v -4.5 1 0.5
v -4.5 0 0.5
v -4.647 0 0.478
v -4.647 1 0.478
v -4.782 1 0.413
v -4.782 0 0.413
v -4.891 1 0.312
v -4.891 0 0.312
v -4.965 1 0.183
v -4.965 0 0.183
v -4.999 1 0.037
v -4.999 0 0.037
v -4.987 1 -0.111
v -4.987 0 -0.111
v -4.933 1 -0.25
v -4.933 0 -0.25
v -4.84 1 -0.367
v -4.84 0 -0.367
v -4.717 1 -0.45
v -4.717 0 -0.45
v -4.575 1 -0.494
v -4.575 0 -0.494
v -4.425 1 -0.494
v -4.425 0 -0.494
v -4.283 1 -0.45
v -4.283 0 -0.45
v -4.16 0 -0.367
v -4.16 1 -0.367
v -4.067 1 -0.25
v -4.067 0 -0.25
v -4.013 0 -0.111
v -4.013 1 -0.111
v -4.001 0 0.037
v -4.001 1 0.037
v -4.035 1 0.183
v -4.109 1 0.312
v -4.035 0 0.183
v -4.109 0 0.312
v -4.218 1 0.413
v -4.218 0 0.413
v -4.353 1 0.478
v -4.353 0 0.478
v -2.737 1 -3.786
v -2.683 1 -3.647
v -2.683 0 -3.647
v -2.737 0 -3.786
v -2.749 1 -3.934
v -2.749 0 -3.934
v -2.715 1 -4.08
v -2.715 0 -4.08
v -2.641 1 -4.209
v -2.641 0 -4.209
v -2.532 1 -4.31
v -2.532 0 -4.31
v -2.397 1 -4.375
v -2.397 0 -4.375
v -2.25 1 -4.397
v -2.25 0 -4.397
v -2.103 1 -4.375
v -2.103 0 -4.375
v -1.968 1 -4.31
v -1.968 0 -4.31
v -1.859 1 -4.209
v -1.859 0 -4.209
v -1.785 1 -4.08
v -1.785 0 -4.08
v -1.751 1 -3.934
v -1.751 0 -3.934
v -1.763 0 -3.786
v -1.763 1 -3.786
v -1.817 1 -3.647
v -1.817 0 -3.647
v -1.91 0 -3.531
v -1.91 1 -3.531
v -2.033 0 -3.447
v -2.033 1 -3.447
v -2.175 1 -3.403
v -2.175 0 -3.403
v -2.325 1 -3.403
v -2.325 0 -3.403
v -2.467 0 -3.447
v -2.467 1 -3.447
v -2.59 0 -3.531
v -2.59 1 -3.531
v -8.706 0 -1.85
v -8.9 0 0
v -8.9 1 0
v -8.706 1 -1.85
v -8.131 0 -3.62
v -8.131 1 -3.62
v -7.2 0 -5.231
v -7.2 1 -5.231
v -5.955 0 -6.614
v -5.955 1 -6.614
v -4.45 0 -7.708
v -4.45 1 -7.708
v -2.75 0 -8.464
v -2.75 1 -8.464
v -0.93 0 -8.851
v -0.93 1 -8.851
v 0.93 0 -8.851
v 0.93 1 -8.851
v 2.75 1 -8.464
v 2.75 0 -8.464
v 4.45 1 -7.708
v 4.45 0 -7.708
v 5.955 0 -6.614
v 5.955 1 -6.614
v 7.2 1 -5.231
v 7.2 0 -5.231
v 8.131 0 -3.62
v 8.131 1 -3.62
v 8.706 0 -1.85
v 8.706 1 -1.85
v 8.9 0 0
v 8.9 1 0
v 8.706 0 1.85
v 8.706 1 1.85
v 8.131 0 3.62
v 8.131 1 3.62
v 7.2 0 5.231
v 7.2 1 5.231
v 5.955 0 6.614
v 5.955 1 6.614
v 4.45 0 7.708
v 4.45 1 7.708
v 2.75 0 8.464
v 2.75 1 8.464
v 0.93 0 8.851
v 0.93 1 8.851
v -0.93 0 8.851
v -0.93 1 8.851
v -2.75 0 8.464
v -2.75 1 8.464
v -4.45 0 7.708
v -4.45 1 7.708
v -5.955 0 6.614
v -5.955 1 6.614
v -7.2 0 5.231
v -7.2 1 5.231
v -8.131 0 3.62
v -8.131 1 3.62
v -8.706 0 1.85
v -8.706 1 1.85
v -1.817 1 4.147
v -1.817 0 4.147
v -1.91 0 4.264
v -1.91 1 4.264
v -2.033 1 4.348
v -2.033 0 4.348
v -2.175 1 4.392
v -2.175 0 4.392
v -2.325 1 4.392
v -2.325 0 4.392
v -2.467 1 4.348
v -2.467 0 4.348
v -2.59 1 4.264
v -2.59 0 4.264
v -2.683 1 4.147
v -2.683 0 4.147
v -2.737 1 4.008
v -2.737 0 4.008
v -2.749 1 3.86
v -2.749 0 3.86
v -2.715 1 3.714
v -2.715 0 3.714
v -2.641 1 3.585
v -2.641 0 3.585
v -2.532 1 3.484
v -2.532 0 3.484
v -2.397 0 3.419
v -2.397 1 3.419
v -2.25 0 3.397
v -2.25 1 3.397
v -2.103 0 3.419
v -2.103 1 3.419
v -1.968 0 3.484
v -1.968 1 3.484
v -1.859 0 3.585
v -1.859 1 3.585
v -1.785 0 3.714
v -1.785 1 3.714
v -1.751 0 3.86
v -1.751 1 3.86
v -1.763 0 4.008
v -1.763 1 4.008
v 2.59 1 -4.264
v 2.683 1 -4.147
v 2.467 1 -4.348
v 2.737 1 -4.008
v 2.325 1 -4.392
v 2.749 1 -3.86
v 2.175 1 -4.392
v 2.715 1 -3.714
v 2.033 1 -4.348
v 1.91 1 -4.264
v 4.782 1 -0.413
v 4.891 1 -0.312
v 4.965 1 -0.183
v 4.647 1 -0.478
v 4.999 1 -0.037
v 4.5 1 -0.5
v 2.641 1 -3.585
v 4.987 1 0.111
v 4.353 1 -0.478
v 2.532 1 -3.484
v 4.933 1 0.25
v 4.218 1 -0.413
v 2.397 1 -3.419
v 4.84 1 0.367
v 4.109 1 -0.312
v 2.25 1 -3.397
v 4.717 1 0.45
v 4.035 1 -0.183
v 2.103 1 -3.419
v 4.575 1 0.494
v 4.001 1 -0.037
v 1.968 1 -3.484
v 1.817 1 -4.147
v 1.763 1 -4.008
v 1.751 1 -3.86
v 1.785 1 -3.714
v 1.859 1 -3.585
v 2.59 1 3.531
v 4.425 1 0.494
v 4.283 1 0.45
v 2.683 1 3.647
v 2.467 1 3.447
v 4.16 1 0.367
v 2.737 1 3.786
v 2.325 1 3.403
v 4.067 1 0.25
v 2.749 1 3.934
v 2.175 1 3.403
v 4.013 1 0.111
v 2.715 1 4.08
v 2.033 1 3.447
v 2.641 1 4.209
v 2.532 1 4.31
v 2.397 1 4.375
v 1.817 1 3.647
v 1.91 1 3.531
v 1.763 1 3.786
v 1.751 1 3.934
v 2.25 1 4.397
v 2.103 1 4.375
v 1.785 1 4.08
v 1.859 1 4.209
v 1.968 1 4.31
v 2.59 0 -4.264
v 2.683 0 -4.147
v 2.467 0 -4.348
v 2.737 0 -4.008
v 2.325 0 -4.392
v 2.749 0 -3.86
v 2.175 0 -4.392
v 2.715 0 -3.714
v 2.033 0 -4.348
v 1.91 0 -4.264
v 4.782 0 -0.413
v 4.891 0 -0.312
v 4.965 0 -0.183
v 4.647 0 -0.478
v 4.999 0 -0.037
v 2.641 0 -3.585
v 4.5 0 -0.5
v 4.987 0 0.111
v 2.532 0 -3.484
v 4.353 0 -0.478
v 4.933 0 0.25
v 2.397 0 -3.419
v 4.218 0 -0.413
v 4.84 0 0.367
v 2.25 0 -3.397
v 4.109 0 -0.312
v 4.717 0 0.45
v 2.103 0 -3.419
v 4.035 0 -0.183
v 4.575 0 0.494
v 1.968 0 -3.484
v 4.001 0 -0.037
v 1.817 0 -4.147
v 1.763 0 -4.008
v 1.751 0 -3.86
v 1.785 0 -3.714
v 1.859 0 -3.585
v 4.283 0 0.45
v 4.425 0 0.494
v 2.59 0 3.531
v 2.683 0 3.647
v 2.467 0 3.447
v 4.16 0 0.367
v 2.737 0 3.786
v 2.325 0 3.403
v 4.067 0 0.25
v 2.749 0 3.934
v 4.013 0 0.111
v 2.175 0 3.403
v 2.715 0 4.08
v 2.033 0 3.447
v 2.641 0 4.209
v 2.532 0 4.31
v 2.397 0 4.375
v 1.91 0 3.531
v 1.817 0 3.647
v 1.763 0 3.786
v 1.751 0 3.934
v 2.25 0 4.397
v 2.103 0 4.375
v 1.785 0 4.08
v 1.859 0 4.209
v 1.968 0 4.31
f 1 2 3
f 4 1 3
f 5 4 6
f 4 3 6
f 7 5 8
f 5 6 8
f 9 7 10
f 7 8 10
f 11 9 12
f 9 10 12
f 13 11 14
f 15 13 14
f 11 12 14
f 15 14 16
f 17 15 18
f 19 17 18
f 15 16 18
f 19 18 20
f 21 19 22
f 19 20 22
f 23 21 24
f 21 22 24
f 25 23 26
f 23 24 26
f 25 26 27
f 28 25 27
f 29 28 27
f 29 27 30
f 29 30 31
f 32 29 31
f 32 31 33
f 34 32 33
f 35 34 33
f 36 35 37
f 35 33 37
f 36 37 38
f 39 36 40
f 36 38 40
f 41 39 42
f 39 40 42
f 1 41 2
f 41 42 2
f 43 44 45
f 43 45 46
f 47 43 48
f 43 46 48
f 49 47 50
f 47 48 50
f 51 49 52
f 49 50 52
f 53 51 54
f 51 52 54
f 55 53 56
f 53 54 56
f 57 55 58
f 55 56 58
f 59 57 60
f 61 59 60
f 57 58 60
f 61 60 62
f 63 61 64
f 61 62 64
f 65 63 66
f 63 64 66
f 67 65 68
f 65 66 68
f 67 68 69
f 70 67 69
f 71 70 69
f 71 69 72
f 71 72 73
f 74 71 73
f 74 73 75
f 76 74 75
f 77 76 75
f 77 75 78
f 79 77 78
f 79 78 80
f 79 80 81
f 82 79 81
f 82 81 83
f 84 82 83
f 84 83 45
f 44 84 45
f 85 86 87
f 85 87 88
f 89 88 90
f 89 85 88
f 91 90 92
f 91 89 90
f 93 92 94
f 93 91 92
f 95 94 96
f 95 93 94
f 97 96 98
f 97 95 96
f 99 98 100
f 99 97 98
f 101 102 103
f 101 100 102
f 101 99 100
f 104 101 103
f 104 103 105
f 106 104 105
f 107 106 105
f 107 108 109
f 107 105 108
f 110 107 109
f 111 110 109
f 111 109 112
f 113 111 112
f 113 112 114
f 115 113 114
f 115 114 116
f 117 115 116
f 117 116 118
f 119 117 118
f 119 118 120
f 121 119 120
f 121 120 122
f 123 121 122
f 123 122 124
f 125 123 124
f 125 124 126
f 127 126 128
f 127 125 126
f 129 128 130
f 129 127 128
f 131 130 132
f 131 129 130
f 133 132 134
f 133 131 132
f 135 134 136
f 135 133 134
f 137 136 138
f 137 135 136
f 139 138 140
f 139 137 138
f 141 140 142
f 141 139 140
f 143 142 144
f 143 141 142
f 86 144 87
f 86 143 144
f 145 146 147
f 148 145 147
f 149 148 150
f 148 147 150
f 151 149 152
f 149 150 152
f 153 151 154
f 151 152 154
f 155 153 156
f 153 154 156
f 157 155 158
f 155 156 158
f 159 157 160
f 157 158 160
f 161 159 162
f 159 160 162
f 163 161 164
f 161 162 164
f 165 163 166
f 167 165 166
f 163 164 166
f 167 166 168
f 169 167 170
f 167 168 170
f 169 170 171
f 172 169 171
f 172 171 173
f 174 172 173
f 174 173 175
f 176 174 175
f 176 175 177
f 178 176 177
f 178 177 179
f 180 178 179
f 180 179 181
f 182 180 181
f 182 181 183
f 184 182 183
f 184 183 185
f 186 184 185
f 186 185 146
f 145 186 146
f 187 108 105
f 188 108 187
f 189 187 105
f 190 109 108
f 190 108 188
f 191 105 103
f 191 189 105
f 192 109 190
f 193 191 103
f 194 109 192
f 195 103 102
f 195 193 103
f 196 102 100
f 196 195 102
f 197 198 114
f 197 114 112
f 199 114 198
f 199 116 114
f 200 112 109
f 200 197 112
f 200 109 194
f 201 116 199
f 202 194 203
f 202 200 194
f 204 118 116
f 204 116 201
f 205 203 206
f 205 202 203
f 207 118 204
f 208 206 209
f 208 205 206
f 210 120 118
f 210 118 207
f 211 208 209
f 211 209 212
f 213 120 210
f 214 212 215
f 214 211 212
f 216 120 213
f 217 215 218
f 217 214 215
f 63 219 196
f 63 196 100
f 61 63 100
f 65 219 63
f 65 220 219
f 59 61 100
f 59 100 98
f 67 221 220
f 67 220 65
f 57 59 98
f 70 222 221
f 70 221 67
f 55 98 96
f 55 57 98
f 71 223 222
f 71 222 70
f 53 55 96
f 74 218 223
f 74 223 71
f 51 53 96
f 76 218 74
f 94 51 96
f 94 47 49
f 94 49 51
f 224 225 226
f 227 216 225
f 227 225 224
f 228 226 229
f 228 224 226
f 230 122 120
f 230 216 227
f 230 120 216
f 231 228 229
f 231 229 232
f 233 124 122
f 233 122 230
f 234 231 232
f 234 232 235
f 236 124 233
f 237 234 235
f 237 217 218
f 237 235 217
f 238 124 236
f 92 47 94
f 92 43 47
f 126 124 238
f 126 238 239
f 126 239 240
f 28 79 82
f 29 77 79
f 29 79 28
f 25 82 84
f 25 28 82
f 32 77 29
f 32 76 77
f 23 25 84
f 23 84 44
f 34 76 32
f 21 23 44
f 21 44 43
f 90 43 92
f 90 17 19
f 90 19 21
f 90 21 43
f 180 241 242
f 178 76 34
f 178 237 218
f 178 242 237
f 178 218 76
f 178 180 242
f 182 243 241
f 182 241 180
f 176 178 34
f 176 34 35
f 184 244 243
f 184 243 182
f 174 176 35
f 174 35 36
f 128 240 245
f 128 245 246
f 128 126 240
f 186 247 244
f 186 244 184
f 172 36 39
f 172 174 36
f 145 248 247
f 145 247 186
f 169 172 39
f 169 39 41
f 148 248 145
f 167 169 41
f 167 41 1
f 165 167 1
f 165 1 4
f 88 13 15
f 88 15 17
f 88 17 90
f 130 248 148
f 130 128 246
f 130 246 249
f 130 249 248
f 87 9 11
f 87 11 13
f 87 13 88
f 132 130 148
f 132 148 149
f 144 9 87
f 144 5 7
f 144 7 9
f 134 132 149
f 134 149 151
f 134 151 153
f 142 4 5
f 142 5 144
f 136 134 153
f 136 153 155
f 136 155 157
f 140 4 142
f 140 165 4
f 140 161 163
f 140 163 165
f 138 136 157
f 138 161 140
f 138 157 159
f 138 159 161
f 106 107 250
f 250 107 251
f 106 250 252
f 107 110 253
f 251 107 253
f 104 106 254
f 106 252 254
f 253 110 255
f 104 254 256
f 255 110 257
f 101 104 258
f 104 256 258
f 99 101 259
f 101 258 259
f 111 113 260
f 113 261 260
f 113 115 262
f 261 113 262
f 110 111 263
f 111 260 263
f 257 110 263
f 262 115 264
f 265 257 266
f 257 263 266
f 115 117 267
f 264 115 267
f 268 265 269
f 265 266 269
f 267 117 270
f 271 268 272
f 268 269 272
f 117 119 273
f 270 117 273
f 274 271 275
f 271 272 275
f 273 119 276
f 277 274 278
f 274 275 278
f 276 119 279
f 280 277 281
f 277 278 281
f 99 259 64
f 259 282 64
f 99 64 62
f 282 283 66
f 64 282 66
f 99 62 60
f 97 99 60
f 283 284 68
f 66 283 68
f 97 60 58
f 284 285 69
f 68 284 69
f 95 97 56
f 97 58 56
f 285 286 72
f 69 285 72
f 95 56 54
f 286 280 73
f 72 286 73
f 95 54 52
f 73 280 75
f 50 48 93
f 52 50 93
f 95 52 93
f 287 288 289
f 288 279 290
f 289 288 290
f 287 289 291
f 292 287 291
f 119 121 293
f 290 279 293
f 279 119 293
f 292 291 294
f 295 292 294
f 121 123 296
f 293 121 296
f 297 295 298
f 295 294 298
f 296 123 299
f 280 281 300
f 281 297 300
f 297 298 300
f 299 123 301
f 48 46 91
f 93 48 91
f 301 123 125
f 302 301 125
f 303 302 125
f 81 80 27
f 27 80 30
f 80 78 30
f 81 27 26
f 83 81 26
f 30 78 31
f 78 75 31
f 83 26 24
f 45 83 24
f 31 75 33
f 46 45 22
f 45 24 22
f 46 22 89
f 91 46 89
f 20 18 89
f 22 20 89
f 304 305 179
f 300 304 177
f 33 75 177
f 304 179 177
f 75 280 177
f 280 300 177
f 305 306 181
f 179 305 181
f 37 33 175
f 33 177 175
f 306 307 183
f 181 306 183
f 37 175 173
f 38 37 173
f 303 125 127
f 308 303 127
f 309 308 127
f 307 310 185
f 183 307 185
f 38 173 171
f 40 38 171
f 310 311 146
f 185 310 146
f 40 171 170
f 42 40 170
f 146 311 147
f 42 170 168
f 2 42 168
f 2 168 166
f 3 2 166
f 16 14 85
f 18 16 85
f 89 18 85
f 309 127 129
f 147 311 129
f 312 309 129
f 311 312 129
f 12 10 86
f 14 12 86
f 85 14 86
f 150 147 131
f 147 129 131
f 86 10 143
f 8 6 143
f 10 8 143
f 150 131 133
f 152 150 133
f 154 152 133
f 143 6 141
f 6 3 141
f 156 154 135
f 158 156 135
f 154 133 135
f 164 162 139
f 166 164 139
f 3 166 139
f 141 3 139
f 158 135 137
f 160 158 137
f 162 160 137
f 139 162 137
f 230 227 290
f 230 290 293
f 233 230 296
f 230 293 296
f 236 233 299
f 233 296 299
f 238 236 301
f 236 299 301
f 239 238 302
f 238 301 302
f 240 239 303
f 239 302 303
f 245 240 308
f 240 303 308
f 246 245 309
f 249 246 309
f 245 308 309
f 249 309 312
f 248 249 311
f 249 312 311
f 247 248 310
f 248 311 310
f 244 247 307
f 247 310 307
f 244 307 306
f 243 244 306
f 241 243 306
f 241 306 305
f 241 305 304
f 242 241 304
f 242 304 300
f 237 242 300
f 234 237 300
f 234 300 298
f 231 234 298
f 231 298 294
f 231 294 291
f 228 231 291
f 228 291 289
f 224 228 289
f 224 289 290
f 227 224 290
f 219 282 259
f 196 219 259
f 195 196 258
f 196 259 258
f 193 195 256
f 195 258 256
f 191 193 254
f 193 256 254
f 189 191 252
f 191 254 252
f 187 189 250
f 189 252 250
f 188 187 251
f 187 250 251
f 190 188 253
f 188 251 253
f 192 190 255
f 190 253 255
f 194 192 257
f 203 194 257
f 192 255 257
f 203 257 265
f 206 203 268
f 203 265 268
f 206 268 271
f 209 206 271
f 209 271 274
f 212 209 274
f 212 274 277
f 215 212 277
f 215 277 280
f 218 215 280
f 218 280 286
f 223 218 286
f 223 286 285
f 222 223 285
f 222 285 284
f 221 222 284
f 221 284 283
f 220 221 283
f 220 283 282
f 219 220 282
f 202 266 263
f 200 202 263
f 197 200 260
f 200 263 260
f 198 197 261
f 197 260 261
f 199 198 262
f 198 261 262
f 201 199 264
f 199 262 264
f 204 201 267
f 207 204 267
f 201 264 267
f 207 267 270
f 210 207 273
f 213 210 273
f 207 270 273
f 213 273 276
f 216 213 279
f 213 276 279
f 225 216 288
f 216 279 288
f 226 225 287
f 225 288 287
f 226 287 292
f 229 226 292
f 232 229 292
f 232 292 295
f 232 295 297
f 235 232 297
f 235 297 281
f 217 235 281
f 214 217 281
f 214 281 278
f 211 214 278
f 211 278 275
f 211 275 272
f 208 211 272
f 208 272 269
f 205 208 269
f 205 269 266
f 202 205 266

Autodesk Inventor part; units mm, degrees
ref_plane "YZ Plane" through (0, 0, 0) normal (1, 0, 0) x (0, 1, 0)
ref_plane "XZ Plane" through (0, 0, 0) normal (0, 1, 0) x (-1, 0, 0)
ref_plane "XY Plane" through (0, 0, 0) normal (0, 0, 1) x (1, 0, 0)
sketch "Sketch1" plane through (0, 0, 0) normal (0, 1, 0) x (-1, 0, 0)
  circle A0 centre (0, 0) radius 8.9
  dimension "d0" = 17.8
extrude "Extrusion1" add sketch "Sketch1" along normal blind 1
sketch "Sketch2" plane through (0, 1, 0) normal (0, 1, 0) x (1, 0, 0)
  point P0 (0, 0)
  point P1 (-4.5, 0)
  dimension "d4" = 4.5
hole "Hole1" at (-4.5, 1, 0) direction (0, -1, 0) diameter 1 end through all
pattern_circular "Circular Pattern1" count 6 over 360 about axis through (0, 0, 0) along (0, 1, 0) of "Hole1"
properties part number "EpoxyFitThroughKF16_mask" material "Epoxy Resin"
